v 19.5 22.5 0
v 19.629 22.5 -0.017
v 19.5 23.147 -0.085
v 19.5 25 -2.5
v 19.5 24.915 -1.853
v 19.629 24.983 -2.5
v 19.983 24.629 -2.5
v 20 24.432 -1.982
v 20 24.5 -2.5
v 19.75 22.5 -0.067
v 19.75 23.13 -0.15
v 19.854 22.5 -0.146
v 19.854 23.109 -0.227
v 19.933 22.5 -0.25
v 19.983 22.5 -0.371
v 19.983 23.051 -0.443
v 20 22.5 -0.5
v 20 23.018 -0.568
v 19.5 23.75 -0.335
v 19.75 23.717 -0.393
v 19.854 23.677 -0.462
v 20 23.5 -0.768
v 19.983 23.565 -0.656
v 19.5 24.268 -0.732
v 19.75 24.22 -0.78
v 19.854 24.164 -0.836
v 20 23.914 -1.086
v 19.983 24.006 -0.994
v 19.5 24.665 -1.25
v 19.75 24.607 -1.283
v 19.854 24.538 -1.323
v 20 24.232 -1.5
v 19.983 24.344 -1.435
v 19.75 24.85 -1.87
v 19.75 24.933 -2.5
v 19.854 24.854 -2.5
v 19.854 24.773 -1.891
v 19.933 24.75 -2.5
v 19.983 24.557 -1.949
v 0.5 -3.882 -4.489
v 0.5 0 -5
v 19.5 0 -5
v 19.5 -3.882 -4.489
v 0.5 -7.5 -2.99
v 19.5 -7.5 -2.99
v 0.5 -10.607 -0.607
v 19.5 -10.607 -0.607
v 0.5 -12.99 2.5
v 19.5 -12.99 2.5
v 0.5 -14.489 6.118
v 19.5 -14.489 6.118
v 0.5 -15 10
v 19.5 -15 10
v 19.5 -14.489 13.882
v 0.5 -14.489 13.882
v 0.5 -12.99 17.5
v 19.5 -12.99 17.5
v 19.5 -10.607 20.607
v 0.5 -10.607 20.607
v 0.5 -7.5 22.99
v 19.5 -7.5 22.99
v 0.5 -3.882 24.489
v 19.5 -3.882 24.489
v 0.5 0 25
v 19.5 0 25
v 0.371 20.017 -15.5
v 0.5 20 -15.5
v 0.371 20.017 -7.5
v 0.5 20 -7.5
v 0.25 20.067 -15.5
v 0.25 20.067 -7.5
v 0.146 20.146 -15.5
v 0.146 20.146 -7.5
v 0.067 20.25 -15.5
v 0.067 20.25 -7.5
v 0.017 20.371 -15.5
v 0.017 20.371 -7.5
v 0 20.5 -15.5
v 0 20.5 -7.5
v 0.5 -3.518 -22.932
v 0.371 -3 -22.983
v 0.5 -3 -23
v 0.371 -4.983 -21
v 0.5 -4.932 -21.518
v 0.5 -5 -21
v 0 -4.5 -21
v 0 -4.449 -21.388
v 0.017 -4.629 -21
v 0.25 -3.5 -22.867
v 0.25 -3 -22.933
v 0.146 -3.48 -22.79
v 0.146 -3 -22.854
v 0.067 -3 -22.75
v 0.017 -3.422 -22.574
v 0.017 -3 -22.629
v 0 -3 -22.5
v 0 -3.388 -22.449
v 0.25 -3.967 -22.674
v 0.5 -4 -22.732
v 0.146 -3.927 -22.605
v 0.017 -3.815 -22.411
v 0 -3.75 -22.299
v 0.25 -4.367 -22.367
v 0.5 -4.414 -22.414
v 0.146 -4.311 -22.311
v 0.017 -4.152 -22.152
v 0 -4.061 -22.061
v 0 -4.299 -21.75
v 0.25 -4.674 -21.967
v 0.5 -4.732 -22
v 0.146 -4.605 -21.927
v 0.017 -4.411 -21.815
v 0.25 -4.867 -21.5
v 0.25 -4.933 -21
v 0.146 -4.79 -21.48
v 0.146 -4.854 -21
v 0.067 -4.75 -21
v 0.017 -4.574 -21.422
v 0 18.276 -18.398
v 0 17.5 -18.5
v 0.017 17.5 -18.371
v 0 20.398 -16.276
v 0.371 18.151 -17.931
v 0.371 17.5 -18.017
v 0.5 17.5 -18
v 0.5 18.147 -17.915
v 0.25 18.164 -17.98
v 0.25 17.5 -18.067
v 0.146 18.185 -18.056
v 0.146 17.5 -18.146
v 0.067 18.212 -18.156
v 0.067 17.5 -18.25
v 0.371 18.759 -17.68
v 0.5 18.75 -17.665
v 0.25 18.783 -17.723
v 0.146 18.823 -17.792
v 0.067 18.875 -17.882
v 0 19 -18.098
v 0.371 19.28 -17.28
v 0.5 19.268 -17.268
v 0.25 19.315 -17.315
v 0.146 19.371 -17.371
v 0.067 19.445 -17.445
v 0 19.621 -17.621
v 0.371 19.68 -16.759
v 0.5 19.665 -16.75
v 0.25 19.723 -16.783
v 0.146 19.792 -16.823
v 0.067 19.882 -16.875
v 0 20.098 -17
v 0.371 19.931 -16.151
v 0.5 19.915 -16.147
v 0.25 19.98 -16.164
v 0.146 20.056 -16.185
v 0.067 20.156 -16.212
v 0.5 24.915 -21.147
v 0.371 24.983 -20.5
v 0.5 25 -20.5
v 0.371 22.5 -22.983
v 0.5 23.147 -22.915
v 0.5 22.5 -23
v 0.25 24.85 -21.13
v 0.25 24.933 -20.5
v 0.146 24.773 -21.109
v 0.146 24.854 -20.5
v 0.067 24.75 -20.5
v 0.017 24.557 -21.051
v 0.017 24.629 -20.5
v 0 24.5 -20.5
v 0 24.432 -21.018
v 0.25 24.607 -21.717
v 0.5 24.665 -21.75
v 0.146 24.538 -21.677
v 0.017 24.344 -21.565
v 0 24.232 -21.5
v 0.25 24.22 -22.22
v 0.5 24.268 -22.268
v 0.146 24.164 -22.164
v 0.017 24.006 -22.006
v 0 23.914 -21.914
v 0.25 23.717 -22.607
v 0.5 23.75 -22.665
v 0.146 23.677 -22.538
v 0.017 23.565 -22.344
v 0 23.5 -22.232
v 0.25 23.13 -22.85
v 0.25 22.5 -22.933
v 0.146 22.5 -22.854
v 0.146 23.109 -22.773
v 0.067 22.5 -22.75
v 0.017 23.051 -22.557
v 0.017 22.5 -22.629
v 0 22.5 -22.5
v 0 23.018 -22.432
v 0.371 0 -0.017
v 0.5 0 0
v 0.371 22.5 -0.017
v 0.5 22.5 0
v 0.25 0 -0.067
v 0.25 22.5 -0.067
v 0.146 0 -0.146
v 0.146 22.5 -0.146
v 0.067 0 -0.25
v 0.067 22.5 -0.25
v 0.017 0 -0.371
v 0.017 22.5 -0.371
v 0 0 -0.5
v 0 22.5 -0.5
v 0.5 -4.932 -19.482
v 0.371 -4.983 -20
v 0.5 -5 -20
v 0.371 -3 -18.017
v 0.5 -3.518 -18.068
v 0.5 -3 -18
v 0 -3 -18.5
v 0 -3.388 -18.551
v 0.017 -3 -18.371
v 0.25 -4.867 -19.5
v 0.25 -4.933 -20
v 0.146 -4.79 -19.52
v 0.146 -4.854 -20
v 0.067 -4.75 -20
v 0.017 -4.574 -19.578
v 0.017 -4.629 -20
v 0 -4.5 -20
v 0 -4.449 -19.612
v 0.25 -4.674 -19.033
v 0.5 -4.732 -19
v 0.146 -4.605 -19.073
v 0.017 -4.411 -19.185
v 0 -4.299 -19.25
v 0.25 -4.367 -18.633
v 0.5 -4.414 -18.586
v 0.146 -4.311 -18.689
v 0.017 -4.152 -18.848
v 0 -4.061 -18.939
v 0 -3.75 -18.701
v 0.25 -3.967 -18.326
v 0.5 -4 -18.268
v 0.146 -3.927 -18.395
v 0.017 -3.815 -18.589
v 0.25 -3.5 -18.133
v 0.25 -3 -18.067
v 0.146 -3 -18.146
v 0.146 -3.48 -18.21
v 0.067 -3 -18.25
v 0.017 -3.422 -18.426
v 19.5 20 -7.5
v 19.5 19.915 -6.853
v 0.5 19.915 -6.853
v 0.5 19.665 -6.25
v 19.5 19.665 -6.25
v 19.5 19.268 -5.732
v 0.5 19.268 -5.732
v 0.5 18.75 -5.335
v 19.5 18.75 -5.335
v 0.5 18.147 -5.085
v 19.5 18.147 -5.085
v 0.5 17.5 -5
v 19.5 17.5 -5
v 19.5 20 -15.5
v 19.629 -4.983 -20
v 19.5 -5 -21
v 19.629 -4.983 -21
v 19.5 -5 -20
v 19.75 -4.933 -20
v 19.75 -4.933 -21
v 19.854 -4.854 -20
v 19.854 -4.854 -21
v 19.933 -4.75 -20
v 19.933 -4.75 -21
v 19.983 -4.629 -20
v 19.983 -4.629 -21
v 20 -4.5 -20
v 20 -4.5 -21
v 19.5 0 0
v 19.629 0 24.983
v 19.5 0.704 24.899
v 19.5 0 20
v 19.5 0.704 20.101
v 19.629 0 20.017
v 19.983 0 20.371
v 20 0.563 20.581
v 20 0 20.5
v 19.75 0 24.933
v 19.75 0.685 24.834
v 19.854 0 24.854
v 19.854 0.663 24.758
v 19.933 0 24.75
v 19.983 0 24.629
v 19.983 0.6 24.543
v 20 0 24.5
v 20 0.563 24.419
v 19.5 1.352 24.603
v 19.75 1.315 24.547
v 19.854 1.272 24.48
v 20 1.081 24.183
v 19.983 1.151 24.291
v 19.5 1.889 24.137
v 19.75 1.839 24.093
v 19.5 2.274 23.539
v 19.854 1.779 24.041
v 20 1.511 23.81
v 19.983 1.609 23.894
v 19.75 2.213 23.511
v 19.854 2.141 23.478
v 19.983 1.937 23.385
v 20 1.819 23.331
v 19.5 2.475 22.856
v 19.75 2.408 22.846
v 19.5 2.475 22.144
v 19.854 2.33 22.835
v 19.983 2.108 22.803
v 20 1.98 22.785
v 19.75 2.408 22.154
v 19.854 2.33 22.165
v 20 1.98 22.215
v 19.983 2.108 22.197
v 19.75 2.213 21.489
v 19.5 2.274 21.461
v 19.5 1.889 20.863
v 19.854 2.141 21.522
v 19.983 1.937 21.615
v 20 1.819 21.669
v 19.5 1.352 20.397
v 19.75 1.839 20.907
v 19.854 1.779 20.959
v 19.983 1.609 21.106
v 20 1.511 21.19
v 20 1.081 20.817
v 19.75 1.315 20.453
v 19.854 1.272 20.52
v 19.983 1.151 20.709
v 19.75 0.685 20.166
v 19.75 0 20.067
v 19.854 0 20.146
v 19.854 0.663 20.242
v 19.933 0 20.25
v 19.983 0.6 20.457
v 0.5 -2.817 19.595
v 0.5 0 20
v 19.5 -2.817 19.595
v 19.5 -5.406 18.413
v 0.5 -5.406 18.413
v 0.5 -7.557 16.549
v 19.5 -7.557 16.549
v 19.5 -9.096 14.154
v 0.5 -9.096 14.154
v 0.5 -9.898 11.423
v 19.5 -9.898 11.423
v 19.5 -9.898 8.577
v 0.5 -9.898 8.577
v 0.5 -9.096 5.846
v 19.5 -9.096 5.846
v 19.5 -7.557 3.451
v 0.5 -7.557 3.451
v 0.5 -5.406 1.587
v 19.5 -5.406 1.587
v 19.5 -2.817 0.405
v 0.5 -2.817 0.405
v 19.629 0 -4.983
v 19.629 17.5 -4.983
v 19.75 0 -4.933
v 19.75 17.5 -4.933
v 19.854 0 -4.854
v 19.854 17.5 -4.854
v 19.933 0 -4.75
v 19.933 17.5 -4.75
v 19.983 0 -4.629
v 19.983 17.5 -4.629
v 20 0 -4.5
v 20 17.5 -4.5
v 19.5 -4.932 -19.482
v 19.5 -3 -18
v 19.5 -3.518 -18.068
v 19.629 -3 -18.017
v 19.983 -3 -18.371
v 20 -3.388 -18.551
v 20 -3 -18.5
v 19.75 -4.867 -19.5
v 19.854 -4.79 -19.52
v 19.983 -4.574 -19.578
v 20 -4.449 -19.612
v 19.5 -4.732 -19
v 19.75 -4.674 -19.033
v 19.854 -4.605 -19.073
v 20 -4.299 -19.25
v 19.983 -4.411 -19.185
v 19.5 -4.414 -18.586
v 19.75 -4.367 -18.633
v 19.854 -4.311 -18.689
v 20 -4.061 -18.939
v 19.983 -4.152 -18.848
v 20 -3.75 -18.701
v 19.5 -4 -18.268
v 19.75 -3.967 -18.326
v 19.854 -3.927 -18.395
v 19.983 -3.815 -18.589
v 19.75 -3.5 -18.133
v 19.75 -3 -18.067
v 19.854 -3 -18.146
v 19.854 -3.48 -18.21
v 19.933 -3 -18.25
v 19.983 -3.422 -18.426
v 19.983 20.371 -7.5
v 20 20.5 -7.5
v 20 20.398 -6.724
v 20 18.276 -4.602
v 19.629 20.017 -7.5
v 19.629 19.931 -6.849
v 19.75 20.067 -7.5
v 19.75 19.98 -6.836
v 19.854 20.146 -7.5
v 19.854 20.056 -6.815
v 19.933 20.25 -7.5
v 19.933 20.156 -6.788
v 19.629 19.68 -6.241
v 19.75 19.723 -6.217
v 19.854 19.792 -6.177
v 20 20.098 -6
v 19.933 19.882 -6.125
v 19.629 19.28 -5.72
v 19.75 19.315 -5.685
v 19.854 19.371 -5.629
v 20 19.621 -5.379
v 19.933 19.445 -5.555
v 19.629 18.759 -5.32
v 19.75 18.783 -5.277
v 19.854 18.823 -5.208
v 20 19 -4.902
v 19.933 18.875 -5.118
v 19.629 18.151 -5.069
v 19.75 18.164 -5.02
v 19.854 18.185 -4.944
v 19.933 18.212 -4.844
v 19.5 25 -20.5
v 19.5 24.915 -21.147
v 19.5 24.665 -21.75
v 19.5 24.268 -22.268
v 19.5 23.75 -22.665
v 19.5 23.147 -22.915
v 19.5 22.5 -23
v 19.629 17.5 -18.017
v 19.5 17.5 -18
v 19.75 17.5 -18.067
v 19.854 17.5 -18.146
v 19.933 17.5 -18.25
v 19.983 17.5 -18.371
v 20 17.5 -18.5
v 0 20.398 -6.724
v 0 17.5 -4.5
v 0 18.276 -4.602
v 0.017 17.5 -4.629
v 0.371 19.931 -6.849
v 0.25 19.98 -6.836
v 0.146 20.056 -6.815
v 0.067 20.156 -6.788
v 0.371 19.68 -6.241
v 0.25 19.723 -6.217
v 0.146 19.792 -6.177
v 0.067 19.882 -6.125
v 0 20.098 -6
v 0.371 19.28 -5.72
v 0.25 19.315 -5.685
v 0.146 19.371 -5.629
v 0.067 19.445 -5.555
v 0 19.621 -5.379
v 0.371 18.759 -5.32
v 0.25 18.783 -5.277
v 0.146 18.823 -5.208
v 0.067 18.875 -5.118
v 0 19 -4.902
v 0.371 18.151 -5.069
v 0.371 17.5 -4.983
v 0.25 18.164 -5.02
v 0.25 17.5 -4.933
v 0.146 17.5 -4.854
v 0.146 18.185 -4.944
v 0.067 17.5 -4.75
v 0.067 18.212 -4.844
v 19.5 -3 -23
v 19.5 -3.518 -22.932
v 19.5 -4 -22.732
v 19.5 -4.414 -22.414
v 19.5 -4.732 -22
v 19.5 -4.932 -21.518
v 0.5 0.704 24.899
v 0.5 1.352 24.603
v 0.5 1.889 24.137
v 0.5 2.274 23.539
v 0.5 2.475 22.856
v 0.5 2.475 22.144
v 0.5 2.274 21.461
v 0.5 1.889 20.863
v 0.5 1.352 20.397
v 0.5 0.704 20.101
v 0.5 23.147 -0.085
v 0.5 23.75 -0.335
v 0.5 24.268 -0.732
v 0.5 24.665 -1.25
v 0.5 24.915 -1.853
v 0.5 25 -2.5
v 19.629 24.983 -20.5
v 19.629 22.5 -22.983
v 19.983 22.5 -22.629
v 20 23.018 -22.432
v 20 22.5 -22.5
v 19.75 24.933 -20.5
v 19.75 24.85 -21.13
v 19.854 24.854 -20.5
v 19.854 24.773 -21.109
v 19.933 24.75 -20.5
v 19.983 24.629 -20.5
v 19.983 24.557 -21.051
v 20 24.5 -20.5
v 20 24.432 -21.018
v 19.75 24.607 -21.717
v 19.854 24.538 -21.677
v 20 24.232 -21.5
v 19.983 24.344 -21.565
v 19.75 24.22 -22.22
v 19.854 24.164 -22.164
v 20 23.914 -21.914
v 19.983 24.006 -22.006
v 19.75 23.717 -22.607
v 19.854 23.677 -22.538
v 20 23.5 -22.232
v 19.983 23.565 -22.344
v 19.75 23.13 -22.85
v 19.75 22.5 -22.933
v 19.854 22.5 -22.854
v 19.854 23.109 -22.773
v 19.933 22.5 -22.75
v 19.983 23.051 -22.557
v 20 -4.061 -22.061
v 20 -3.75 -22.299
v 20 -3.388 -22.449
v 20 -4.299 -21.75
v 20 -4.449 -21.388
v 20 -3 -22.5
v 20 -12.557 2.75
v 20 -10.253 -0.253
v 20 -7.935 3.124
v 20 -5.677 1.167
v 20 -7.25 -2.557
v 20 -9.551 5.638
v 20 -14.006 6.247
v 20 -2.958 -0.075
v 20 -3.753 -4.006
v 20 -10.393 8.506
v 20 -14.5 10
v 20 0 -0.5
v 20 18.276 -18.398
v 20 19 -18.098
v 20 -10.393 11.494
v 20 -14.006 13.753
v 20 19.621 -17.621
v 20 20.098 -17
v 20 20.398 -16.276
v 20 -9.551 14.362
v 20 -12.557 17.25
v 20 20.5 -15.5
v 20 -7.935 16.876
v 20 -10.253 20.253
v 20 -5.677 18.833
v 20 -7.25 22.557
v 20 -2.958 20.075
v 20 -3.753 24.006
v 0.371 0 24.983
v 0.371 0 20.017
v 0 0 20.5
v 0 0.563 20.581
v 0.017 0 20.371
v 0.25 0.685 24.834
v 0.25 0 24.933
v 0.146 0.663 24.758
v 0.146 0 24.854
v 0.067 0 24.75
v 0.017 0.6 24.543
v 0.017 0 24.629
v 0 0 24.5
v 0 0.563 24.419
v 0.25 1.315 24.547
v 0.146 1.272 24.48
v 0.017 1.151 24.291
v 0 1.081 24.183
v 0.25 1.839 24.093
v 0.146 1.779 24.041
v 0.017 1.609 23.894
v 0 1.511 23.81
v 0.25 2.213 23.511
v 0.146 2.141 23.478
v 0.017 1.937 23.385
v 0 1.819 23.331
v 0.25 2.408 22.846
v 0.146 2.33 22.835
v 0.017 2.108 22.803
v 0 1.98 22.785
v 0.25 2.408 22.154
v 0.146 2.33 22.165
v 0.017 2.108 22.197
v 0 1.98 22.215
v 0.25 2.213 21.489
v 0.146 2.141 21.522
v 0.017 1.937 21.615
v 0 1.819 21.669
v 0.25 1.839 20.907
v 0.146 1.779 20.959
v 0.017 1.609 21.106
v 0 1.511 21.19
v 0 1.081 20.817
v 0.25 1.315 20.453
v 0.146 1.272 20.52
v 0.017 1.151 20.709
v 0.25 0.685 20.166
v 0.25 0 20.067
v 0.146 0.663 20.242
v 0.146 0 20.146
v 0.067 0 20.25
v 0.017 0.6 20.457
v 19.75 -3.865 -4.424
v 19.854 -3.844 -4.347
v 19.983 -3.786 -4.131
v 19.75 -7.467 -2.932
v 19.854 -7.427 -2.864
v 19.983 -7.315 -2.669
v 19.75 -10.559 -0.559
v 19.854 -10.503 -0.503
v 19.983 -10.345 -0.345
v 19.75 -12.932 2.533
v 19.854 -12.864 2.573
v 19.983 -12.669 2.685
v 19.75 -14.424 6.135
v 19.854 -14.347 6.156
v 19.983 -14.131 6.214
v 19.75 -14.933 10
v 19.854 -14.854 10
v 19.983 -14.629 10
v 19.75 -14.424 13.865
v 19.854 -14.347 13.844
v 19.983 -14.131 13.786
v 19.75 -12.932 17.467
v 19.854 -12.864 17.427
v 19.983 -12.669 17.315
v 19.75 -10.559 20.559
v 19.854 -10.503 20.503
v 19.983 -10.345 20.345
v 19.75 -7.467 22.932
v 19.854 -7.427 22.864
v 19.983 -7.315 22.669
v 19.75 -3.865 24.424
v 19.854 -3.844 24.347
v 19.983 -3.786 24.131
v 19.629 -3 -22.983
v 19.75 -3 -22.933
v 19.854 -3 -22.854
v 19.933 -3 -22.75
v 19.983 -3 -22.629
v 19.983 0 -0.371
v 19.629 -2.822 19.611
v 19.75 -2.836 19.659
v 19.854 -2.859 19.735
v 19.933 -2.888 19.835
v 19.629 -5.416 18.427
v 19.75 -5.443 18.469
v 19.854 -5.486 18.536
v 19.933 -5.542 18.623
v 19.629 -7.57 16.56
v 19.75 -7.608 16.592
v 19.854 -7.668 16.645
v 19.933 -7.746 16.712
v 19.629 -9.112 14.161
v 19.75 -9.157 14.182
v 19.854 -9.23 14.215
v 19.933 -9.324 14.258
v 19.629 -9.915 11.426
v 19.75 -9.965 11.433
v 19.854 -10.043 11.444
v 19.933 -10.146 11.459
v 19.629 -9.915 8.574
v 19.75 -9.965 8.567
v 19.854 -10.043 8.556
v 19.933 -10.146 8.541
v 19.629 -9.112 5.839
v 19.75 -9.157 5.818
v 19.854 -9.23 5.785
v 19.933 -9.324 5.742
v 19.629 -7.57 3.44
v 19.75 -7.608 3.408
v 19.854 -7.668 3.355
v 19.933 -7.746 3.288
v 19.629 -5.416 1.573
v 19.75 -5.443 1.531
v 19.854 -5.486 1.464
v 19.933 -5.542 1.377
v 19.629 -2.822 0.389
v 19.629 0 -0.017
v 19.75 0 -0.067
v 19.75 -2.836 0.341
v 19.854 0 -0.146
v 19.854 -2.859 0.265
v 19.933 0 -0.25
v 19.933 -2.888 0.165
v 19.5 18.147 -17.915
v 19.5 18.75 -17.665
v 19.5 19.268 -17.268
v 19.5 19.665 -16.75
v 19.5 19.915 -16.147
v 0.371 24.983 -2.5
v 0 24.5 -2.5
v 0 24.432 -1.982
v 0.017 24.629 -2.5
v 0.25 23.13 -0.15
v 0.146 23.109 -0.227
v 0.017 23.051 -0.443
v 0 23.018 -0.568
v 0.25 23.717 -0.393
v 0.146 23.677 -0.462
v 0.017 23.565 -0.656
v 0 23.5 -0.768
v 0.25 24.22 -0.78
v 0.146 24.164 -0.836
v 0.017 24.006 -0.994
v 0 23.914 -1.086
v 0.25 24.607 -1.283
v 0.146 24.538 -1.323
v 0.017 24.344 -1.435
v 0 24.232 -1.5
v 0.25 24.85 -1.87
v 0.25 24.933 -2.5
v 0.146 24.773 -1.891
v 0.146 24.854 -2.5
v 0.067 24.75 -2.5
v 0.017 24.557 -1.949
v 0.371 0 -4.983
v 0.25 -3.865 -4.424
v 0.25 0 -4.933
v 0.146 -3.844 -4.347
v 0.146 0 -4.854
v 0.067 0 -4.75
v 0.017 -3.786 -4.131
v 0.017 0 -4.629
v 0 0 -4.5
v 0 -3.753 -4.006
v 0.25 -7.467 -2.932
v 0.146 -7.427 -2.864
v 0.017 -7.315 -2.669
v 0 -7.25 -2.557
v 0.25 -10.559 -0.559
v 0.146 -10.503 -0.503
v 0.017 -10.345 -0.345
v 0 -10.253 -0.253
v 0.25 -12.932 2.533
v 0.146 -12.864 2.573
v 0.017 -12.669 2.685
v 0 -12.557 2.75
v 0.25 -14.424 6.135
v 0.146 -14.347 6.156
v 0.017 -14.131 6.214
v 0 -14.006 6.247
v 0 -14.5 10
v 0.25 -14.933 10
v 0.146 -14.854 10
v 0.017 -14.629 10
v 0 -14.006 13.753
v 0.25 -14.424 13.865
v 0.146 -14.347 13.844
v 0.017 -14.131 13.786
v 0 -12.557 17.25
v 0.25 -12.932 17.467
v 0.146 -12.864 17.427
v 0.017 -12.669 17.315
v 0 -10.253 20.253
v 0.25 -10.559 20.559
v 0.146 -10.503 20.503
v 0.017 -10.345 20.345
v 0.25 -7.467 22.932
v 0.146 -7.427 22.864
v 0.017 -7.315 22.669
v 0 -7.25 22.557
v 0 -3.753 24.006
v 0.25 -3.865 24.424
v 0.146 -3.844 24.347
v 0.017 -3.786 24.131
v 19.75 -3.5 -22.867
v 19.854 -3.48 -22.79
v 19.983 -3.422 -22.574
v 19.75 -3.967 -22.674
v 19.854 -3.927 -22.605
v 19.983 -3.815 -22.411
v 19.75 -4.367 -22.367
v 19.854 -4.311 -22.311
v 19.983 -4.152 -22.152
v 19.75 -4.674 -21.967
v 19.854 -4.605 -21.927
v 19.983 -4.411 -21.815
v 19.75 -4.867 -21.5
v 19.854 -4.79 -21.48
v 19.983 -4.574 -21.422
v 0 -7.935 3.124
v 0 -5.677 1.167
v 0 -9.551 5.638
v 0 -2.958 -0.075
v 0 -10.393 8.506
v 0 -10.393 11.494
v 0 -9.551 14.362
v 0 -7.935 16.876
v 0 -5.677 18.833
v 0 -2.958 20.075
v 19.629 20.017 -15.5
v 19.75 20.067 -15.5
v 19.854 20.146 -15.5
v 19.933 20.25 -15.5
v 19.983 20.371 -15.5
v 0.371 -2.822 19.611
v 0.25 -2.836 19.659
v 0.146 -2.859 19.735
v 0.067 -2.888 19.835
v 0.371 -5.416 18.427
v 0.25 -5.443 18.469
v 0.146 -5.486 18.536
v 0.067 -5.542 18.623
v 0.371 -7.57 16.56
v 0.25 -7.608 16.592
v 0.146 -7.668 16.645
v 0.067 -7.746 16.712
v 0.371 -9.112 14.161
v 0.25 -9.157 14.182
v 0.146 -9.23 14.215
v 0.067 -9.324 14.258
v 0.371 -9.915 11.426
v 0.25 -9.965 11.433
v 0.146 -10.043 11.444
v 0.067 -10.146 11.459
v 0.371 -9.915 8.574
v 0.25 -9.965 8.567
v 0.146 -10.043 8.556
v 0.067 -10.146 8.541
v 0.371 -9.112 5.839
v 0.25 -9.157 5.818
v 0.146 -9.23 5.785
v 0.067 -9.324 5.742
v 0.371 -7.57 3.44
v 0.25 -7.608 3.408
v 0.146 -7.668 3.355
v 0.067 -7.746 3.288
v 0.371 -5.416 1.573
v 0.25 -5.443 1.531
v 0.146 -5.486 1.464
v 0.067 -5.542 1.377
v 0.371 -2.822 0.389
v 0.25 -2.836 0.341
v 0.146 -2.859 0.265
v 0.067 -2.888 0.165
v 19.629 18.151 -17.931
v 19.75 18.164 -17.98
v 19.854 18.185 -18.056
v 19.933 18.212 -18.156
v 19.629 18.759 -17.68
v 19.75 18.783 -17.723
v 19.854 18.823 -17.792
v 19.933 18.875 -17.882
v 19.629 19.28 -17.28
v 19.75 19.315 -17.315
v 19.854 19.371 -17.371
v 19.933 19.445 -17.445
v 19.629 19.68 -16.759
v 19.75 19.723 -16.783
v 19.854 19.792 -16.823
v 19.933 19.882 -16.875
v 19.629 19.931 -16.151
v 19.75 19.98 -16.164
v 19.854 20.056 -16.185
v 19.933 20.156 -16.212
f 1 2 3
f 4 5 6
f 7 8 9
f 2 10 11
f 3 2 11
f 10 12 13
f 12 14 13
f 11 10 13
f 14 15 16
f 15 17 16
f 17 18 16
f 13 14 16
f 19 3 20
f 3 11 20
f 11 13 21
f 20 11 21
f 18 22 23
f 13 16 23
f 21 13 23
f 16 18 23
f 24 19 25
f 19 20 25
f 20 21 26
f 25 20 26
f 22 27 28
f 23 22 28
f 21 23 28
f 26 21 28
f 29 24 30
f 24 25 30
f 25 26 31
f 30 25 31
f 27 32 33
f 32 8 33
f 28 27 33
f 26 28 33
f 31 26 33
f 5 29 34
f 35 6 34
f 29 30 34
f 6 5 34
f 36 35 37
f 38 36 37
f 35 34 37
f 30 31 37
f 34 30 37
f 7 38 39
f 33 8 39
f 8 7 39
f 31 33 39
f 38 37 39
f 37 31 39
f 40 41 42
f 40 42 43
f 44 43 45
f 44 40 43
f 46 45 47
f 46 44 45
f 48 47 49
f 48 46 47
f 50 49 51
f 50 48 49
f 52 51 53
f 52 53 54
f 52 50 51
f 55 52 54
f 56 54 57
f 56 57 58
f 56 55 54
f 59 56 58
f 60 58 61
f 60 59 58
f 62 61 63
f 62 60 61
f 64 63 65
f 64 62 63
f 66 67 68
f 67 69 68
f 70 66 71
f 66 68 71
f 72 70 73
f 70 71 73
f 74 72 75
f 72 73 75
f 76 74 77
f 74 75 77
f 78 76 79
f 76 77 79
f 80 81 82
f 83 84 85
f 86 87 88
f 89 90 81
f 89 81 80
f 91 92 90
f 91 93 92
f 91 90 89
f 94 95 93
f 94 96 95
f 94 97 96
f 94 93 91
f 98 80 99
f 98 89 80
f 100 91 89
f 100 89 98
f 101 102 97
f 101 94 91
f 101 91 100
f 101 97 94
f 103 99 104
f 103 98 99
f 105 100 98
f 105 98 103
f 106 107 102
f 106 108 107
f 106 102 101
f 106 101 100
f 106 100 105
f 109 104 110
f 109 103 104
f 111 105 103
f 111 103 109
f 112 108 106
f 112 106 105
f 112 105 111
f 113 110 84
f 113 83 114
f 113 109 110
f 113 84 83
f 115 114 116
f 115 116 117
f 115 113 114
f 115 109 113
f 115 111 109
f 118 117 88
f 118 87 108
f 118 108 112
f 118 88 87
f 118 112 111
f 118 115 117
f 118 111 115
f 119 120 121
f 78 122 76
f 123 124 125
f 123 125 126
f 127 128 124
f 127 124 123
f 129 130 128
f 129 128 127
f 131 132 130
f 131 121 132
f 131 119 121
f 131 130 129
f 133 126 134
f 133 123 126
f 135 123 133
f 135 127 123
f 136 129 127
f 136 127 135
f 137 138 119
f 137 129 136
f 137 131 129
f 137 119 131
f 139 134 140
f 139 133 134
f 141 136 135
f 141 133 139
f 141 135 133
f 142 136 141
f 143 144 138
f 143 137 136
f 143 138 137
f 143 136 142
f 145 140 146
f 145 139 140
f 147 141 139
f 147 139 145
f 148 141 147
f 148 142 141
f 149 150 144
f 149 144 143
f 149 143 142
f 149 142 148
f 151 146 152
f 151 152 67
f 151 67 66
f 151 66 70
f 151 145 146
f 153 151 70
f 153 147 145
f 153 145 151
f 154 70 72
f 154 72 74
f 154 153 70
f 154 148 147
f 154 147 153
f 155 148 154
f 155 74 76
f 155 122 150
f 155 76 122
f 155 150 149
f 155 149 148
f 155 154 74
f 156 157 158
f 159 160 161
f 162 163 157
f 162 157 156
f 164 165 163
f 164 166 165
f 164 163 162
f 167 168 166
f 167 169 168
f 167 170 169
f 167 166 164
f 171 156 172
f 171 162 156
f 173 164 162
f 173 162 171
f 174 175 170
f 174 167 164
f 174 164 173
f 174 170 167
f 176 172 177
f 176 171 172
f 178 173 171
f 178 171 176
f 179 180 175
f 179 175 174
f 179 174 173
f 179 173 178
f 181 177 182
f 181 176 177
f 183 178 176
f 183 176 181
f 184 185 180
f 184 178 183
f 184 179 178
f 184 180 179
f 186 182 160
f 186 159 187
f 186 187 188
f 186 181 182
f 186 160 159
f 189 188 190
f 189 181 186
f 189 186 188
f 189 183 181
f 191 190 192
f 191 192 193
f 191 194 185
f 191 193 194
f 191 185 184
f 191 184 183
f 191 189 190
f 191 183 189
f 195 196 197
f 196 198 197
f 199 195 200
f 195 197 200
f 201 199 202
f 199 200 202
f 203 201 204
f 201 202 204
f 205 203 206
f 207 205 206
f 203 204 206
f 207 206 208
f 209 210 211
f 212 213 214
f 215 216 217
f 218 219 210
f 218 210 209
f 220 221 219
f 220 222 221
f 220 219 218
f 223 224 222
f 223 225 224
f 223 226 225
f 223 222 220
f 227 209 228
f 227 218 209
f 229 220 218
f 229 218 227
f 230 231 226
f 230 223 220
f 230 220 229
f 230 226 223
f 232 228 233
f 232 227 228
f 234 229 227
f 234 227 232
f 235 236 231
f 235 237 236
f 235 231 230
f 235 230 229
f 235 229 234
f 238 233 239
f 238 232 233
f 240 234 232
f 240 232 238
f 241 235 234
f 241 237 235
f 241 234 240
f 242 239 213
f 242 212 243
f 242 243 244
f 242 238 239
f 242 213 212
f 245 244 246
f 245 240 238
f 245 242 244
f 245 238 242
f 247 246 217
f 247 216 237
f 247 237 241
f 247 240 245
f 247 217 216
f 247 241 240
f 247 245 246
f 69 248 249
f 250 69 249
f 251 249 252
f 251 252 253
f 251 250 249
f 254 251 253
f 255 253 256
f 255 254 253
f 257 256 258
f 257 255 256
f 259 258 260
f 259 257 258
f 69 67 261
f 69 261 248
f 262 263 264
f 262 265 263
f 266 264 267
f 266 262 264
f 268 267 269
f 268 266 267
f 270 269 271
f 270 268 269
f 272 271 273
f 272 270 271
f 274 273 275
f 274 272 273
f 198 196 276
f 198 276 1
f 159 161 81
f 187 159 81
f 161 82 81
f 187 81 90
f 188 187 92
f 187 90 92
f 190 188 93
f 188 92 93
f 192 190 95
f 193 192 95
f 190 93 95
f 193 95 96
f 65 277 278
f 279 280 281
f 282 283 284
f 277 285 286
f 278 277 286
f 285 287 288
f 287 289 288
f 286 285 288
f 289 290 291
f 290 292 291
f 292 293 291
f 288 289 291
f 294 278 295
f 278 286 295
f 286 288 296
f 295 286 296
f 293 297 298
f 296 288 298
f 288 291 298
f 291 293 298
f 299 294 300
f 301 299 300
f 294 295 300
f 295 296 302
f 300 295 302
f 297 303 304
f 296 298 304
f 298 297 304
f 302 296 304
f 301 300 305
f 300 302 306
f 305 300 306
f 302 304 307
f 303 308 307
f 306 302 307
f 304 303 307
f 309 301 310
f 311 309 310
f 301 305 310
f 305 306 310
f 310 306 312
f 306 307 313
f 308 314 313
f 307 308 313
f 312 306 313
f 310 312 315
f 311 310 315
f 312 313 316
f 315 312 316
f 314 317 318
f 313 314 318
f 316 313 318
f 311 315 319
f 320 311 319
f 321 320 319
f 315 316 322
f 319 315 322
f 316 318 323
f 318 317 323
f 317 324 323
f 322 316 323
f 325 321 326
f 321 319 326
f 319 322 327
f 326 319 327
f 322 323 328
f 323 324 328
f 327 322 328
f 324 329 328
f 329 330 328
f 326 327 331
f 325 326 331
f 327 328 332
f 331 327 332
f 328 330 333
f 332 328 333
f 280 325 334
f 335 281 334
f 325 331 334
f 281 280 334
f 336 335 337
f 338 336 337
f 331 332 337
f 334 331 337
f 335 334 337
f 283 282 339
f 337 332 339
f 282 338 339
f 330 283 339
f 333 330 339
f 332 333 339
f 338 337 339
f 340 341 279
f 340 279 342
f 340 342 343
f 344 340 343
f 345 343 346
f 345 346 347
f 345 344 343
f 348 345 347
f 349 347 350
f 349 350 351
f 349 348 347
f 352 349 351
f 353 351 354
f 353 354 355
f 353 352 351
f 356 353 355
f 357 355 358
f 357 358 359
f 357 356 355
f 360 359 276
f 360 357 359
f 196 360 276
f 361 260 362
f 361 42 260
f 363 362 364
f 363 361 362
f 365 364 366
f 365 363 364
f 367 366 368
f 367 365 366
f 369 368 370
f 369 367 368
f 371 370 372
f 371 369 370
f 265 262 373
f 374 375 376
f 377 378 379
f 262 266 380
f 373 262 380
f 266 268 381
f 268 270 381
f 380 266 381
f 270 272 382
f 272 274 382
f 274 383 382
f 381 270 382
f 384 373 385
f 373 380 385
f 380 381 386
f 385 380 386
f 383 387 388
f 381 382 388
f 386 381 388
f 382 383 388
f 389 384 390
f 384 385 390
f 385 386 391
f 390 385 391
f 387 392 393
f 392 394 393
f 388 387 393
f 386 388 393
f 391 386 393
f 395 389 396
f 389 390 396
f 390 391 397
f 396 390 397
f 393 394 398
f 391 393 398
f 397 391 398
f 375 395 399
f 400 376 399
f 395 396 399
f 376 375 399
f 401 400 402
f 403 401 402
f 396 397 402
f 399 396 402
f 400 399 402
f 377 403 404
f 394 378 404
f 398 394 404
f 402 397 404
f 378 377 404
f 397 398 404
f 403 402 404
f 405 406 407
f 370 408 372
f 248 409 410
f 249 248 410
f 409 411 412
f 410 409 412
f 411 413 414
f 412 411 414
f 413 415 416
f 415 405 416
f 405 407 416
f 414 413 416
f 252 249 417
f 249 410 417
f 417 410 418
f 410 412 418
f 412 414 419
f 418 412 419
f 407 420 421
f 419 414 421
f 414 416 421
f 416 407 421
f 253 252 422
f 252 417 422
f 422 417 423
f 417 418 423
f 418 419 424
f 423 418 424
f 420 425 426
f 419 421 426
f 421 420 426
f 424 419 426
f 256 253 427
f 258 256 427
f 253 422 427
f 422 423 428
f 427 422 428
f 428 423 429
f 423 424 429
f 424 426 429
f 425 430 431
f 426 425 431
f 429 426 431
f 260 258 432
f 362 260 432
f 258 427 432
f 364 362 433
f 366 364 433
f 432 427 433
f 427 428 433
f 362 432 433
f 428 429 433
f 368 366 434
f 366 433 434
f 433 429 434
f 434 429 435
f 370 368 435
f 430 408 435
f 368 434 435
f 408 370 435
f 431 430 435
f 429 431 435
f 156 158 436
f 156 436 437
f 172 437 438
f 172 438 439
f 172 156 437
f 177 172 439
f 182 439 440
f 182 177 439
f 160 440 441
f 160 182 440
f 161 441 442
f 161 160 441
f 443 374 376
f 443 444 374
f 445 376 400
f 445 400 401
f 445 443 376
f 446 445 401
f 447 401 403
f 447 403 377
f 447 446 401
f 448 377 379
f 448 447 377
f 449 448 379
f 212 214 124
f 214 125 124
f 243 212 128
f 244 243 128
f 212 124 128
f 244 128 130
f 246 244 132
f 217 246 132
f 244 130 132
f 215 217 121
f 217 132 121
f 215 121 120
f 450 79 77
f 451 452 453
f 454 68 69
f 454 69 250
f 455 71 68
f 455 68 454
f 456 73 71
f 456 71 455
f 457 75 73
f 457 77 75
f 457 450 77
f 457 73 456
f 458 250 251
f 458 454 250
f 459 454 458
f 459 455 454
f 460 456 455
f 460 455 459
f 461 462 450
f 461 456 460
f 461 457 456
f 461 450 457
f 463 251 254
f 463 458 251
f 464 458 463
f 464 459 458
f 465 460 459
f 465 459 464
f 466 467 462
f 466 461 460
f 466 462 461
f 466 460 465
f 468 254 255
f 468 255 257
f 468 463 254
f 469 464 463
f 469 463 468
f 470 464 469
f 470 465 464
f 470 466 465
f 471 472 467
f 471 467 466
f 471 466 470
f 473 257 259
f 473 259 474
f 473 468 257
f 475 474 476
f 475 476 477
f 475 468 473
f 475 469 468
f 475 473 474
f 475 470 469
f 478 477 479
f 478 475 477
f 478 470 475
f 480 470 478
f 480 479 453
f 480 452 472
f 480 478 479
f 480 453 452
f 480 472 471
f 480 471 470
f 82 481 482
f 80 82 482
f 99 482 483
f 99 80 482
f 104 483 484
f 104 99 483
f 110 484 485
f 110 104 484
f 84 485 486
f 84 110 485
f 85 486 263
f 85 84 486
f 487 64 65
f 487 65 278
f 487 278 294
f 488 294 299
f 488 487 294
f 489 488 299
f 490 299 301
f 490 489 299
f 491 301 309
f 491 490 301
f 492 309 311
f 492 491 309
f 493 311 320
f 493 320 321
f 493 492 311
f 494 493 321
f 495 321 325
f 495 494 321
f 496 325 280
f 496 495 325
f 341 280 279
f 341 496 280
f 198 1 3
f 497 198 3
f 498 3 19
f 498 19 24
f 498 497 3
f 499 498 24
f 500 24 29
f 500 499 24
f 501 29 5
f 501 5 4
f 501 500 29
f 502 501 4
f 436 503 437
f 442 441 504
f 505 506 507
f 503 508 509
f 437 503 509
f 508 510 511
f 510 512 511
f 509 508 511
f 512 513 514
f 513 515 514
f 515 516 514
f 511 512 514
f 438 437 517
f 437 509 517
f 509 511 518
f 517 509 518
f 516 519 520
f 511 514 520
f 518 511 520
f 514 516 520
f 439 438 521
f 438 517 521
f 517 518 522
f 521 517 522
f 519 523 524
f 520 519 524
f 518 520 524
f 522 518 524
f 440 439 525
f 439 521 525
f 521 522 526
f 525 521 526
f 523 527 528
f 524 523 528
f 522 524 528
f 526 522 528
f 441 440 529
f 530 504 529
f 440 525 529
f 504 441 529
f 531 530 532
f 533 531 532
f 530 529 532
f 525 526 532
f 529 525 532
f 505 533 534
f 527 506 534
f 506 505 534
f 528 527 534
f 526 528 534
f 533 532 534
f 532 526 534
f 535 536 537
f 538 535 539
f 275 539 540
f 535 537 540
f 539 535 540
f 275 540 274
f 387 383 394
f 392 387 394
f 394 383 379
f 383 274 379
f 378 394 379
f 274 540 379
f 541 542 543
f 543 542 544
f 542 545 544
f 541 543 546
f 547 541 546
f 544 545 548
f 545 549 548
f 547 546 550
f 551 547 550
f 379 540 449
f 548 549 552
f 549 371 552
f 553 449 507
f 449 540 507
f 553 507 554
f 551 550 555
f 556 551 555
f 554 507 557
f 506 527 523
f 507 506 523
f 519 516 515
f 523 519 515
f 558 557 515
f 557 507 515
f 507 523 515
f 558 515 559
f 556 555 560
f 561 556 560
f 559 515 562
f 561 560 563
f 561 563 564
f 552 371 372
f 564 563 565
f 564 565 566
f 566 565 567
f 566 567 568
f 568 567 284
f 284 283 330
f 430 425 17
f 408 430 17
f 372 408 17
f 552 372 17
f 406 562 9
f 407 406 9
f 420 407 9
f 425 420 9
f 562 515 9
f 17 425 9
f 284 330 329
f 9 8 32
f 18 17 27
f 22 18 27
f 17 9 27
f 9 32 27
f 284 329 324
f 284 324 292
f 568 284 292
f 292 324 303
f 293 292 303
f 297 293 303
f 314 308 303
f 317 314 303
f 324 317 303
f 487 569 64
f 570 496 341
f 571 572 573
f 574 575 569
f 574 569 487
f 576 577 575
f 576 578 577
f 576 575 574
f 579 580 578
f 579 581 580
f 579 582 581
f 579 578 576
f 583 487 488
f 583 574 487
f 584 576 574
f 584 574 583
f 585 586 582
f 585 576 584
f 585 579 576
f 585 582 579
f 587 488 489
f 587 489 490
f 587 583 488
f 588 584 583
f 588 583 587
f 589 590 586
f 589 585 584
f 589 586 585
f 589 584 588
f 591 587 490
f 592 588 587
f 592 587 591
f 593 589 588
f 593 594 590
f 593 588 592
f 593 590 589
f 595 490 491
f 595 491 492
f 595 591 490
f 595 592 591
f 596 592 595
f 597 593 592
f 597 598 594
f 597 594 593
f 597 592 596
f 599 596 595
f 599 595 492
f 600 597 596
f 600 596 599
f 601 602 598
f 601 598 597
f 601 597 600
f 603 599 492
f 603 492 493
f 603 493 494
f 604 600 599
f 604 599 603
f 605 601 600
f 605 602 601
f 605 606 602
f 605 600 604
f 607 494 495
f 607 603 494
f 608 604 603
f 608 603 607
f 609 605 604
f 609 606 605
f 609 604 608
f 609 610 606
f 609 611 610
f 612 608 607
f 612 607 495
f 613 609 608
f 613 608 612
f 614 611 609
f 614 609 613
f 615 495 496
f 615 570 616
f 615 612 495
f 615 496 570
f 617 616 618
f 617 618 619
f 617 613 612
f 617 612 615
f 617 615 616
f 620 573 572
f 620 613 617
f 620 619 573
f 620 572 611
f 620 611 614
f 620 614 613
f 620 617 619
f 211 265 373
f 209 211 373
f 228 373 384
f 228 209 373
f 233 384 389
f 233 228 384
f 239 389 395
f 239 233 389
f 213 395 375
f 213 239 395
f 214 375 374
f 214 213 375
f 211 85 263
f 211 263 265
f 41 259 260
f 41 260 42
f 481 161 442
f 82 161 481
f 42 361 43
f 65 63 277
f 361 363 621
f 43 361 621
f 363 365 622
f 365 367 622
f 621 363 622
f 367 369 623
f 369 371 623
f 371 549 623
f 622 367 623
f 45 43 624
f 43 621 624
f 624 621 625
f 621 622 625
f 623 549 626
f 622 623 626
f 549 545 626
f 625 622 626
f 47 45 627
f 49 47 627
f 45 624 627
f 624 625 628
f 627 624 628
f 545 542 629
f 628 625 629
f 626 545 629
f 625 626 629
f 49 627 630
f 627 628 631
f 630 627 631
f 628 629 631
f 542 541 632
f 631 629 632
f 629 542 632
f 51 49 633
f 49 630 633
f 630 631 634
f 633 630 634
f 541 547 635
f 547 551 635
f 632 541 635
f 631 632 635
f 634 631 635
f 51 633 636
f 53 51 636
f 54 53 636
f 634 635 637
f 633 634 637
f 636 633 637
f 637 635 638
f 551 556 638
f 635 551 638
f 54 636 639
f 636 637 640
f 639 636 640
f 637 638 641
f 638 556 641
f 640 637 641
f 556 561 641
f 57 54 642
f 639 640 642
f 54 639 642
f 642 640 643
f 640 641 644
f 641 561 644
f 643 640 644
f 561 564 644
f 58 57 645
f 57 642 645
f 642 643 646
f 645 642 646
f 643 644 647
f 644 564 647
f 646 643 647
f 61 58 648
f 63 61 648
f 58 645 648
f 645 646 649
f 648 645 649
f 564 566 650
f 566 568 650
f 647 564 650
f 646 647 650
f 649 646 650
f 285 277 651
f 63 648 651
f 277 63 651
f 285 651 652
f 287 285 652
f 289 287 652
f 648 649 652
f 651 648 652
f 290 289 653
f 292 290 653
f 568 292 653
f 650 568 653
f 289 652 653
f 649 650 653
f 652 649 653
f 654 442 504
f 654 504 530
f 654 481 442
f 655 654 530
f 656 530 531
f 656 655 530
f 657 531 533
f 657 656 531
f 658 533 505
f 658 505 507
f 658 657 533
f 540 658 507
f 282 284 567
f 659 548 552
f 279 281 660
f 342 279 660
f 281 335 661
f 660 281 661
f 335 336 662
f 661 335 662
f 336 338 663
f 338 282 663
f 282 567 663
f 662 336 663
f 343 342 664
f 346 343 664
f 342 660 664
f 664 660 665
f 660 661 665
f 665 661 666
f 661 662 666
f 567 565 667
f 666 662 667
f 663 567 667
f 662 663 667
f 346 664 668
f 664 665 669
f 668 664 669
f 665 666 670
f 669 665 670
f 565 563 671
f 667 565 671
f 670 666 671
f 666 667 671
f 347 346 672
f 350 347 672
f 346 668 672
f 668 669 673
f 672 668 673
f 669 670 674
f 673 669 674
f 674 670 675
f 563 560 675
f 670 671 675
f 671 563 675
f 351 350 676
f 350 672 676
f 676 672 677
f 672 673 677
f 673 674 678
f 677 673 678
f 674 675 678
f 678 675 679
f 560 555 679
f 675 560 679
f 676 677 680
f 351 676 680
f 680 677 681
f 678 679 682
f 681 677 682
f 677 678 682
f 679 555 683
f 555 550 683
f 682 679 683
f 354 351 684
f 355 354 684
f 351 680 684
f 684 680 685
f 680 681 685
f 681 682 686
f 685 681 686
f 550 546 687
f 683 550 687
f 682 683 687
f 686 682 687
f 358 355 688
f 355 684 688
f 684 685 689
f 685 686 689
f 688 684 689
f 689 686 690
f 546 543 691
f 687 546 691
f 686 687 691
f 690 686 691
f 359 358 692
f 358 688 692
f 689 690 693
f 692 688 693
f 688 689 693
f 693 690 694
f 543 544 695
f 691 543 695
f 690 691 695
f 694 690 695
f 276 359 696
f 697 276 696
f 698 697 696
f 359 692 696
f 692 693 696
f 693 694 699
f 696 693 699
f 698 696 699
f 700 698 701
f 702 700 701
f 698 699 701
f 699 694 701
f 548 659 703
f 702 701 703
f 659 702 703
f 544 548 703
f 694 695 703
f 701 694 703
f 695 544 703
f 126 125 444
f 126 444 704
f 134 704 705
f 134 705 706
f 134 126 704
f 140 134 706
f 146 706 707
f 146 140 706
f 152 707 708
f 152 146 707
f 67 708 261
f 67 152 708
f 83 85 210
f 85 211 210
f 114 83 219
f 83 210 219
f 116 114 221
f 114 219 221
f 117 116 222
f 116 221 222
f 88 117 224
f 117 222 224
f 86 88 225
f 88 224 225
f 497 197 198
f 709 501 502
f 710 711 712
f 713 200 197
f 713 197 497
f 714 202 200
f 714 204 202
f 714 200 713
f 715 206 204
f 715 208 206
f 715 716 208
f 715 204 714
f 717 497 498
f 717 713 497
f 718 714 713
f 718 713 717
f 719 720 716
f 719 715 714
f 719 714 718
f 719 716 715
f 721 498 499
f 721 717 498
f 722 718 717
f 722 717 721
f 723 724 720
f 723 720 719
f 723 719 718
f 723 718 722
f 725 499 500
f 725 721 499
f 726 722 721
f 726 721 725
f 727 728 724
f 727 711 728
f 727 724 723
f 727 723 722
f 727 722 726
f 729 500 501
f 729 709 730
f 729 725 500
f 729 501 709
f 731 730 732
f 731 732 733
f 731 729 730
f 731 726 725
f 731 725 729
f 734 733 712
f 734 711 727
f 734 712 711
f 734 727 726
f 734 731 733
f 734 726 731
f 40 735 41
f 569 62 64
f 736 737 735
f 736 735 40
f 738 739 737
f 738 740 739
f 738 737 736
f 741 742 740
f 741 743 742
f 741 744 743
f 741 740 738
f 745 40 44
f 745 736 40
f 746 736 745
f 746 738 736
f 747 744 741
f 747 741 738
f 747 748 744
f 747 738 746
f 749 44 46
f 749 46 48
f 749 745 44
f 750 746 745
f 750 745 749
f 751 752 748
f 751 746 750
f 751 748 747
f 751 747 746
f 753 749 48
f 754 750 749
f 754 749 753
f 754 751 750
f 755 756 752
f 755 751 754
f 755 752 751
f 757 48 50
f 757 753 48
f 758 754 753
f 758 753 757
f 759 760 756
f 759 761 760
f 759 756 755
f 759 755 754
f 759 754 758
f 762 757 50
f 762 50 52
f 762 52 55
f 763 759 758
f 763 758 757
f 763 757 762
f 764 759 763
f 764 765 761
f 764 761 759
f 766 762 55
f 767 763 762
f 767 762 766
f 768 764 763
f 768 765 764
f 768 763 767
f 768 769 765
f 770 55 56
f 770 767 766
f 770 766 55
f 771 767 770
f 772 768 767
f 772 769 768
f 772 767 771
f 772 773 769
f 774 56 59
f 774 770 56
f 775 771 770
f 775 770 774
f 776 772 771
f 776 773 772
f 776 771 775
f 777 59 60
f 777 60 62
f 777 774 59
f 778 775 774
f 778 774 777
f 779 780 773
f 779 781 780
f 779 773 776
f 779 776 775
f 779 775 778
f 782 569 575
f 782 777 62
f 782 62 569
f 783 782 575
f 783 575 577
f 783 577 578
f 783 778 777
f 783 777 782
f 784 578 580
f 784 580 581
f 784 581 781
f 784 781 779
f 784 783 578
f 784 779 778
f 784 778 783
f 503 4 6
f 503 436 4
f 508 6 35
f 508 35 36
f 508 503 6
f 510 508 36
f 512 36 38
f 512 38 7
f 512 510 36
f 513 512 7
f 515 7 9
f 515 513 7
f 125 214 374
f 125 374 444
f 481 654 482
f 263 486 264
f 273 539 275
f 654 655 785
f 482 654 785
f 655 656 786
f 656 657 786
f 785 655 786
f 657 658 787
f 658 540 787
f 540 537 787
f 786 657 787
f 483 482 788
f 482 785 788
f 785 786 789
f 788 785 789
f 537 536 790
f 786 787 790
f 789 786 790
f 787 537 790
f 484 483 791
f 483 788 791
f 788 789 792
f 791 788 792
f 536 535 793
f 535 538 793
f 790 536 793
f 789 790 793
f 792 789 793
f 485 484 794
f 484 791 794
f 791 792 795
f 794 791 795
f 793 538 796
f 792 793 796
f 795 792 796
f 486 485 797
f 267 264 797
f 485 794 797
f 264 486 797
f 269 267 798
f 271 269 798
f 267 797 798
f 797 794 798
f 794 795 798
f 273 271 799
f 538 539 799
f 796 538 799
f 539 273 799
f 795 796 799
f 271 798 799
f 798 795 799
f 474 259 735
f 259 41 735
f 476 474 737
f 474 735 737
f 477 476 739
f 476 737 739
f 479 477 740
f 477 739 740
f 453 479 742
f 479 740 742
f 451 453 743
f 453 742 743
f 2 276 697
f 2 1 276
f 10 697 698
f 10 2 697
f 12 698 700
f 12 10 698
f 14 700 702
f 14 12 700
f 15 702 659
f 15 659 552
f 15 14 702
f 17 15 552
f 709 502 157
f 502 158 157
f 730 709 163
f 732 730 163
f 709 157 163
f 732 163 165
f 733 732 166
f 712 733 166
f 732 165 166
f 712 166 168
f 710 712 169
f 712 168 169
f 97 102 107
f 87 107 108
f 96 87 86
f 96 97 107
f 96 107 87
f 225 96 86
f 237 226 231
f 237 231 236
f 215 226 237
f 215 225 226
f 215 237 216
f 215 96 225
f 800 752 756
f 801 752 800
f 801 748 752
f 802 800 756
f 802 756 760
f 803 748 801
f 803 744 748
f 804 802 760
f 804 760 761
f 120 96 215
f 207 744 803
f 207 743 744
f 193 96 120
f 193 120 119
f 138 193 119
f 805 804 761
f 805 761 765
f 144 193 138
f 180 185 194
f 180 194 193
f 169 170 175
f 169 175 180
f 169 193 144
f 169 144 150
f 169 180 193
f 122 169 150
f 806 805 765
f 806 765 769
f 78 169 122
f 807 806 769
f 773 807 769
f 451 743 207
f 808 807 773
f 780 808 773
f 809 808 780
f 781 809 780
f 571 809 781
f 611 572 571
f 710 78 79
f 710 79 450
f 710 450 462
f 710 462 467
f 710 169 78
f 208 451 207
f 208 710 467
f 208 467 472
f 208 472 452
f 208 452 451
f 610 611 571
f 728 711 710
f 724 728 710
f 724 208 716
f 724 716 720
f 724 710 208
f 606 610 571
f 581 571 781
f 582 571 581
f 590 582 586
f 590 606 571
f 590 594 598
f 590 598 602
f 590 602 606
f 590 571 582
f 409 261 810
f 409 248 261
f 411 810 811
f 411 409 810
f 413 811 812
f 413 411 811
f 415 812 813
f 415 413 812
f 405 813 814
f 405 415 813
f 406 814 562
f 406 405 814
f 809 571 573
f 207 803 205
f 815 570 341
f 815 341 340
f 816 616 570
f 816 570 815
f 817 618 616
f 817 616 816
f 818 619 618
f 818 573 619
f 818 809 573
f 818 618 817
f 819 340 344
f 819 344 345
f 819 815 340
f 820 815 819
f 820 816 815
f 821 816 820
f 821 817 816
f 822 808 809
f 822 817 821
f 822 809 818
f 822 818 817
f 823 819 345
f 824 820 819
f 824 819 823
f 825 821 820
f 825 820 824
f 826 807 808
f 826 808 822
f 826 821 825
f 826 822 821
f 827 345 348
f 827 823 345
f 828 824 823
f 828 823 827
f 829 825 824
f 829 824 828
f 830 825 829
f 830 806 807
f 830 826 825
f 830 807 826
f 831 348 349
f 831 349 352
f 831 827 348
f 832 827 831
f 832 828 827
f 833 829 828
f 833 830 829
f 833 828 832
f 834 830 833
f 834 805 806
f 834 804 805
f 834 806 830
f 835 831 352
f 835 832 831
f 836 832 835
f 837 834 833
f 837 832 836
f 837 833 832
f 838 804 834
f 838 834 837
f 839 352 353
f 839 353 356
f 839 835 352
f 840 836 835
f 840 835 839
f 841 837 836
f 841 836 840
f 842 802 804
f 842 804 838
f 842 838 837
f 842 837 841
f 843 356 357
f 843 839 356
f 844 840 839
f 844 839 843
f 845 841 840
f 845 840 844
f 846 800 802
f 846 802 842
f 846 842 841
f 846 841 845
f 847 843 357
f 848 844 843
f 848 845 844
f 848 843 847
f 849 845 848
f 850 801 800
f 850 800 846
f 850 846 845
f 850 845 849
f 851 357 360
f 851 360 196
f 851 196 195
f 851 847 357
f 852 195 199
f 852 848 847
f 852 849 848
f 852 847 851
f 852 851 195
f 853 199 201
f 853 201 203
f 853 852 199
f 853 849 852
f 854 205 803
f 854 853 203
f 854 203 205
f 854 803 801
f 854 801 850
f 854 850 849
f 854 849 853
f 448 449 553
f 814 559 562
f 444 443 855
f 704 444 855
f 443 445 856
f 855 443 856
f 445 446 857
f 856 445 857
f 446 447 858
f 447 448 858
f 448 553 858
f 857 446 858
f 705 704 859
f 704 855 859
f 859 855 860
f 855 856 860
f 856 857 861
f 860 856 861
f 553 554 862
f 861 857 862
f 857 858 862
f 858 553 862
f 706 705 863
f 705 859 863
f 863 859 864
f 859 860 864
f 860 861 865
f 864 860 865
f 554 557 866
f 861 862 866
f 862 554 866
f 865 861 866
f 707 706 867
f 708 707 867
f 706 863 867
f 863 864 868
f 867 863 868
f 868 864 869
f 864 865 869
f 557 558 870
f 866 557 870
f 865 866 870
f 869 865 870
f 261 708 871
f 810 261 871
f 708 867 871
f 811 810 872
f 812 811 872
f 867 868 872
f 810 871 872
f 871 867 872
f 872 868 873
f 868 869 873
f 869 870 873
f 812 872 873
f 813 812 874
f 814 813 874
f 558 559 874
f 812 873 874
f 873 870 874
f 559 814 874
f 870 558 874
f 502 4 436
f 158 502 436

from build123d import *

# Parameters (mm, degrees)
BOSS_EXTRUDE1_DEPTH = 20
FILLET1_R           = 0.5


with BuildPart() as part:
    # Sketch1 → Boss-Extrude1 (new body)
    with BuildSketch(Plane(origin=(0, 0, 0), x_dir=(0, 0, -1), z_dir=(1, 0, 0))):
        with BuildLine():
            Line((0, 0), (0, 22.5))
            ThreePointArc((0, 22.5), (0.732233047, 24.267766953), (2.5, 25))
            Line((2.5, 25), (20.5, 25))
            ThreePointArc((20.5, 25), (22.267766953, 24.267766953), (23, 22.5))
            Line((23, 22.5), (23, -3))
            ThreePointArc((23, -3), (22.414213562, -4.414213562), (21, -5))
            Line((21, -5), (20, -5))
            ThreePointArc((20, -5), (18.585786438, -4.414213562), (18, -3))
            Line((18, -3), (18, 17.5))
            ThreePointArc((18, 17.5), (17.267766953, 19.267766953), (15.5, 20))
            Line((15.5, 20), (7.5, 20))
            ThreePointArc((7.5, 20), (5.732233047, 19.267766953), (5, 17.5))
            Line((5, 17.5), (5, 0))
            ThreePointArc((5, 0), (-10, -15), (-25, 0))
            ThreePointArc((-25, 0), (-22.5, 2.5), (-20, 0))
            ThreePointArc((-20, 0), (-10, -10), (0, 0))
        make_face()
    extrude(amount=BOSS_EXTRUDE1_DEPTH)

    # Fillet1
    fillet1_edges = [part.edges().sort_by_distance(p)[0] for p in [
        (20, 24.267766953, -0.732233047),
        (0, 2.5, 22.5),
        (0, -15, 10),
        (0, 8.75, -5),
        (20, 25, -11.5),
        (0, 19.267766953, -5.732233047),
        (0, 20, -11.5),
        (0, 19.267766953, -17.267766953),
        (0, 7.25, -18),
        (0, -4.414213562, -18.585786438),
        (0, -5, -20.5),
        (0, -4.414213562, -22.414213562),
        (0, 9.75, -23),
        (0, 24.267766953, -22.267766953),
        (0, 25, -11.5),
        (20, 24.267766953, -22.267766953),
        (0, 24.267766953, -0.732233047),
        (0, 11.25, 0),
        (0, -10, 10),
        (20, 9.75, -23),
        (20, -4.414213562, -22.414213562),
        (20, -5, -20.5),
        (20, -4.414213562, -18.585786438),
        (20, 7.25, -18),
        (20, 19.267766953, -17.267766953),
        (20, 20, -11.5),
        (20, -10, 10),
        (20, 19.267766953, -5.732233047),
        (20, 8.75, -5),
        (20, -15, 10),
        (20, 2.5, 22.5),
        (20, 11.25, 0),
    ]]
    fillet(fillet1_edges, radius=FILLET1_R)


solid = part.part
